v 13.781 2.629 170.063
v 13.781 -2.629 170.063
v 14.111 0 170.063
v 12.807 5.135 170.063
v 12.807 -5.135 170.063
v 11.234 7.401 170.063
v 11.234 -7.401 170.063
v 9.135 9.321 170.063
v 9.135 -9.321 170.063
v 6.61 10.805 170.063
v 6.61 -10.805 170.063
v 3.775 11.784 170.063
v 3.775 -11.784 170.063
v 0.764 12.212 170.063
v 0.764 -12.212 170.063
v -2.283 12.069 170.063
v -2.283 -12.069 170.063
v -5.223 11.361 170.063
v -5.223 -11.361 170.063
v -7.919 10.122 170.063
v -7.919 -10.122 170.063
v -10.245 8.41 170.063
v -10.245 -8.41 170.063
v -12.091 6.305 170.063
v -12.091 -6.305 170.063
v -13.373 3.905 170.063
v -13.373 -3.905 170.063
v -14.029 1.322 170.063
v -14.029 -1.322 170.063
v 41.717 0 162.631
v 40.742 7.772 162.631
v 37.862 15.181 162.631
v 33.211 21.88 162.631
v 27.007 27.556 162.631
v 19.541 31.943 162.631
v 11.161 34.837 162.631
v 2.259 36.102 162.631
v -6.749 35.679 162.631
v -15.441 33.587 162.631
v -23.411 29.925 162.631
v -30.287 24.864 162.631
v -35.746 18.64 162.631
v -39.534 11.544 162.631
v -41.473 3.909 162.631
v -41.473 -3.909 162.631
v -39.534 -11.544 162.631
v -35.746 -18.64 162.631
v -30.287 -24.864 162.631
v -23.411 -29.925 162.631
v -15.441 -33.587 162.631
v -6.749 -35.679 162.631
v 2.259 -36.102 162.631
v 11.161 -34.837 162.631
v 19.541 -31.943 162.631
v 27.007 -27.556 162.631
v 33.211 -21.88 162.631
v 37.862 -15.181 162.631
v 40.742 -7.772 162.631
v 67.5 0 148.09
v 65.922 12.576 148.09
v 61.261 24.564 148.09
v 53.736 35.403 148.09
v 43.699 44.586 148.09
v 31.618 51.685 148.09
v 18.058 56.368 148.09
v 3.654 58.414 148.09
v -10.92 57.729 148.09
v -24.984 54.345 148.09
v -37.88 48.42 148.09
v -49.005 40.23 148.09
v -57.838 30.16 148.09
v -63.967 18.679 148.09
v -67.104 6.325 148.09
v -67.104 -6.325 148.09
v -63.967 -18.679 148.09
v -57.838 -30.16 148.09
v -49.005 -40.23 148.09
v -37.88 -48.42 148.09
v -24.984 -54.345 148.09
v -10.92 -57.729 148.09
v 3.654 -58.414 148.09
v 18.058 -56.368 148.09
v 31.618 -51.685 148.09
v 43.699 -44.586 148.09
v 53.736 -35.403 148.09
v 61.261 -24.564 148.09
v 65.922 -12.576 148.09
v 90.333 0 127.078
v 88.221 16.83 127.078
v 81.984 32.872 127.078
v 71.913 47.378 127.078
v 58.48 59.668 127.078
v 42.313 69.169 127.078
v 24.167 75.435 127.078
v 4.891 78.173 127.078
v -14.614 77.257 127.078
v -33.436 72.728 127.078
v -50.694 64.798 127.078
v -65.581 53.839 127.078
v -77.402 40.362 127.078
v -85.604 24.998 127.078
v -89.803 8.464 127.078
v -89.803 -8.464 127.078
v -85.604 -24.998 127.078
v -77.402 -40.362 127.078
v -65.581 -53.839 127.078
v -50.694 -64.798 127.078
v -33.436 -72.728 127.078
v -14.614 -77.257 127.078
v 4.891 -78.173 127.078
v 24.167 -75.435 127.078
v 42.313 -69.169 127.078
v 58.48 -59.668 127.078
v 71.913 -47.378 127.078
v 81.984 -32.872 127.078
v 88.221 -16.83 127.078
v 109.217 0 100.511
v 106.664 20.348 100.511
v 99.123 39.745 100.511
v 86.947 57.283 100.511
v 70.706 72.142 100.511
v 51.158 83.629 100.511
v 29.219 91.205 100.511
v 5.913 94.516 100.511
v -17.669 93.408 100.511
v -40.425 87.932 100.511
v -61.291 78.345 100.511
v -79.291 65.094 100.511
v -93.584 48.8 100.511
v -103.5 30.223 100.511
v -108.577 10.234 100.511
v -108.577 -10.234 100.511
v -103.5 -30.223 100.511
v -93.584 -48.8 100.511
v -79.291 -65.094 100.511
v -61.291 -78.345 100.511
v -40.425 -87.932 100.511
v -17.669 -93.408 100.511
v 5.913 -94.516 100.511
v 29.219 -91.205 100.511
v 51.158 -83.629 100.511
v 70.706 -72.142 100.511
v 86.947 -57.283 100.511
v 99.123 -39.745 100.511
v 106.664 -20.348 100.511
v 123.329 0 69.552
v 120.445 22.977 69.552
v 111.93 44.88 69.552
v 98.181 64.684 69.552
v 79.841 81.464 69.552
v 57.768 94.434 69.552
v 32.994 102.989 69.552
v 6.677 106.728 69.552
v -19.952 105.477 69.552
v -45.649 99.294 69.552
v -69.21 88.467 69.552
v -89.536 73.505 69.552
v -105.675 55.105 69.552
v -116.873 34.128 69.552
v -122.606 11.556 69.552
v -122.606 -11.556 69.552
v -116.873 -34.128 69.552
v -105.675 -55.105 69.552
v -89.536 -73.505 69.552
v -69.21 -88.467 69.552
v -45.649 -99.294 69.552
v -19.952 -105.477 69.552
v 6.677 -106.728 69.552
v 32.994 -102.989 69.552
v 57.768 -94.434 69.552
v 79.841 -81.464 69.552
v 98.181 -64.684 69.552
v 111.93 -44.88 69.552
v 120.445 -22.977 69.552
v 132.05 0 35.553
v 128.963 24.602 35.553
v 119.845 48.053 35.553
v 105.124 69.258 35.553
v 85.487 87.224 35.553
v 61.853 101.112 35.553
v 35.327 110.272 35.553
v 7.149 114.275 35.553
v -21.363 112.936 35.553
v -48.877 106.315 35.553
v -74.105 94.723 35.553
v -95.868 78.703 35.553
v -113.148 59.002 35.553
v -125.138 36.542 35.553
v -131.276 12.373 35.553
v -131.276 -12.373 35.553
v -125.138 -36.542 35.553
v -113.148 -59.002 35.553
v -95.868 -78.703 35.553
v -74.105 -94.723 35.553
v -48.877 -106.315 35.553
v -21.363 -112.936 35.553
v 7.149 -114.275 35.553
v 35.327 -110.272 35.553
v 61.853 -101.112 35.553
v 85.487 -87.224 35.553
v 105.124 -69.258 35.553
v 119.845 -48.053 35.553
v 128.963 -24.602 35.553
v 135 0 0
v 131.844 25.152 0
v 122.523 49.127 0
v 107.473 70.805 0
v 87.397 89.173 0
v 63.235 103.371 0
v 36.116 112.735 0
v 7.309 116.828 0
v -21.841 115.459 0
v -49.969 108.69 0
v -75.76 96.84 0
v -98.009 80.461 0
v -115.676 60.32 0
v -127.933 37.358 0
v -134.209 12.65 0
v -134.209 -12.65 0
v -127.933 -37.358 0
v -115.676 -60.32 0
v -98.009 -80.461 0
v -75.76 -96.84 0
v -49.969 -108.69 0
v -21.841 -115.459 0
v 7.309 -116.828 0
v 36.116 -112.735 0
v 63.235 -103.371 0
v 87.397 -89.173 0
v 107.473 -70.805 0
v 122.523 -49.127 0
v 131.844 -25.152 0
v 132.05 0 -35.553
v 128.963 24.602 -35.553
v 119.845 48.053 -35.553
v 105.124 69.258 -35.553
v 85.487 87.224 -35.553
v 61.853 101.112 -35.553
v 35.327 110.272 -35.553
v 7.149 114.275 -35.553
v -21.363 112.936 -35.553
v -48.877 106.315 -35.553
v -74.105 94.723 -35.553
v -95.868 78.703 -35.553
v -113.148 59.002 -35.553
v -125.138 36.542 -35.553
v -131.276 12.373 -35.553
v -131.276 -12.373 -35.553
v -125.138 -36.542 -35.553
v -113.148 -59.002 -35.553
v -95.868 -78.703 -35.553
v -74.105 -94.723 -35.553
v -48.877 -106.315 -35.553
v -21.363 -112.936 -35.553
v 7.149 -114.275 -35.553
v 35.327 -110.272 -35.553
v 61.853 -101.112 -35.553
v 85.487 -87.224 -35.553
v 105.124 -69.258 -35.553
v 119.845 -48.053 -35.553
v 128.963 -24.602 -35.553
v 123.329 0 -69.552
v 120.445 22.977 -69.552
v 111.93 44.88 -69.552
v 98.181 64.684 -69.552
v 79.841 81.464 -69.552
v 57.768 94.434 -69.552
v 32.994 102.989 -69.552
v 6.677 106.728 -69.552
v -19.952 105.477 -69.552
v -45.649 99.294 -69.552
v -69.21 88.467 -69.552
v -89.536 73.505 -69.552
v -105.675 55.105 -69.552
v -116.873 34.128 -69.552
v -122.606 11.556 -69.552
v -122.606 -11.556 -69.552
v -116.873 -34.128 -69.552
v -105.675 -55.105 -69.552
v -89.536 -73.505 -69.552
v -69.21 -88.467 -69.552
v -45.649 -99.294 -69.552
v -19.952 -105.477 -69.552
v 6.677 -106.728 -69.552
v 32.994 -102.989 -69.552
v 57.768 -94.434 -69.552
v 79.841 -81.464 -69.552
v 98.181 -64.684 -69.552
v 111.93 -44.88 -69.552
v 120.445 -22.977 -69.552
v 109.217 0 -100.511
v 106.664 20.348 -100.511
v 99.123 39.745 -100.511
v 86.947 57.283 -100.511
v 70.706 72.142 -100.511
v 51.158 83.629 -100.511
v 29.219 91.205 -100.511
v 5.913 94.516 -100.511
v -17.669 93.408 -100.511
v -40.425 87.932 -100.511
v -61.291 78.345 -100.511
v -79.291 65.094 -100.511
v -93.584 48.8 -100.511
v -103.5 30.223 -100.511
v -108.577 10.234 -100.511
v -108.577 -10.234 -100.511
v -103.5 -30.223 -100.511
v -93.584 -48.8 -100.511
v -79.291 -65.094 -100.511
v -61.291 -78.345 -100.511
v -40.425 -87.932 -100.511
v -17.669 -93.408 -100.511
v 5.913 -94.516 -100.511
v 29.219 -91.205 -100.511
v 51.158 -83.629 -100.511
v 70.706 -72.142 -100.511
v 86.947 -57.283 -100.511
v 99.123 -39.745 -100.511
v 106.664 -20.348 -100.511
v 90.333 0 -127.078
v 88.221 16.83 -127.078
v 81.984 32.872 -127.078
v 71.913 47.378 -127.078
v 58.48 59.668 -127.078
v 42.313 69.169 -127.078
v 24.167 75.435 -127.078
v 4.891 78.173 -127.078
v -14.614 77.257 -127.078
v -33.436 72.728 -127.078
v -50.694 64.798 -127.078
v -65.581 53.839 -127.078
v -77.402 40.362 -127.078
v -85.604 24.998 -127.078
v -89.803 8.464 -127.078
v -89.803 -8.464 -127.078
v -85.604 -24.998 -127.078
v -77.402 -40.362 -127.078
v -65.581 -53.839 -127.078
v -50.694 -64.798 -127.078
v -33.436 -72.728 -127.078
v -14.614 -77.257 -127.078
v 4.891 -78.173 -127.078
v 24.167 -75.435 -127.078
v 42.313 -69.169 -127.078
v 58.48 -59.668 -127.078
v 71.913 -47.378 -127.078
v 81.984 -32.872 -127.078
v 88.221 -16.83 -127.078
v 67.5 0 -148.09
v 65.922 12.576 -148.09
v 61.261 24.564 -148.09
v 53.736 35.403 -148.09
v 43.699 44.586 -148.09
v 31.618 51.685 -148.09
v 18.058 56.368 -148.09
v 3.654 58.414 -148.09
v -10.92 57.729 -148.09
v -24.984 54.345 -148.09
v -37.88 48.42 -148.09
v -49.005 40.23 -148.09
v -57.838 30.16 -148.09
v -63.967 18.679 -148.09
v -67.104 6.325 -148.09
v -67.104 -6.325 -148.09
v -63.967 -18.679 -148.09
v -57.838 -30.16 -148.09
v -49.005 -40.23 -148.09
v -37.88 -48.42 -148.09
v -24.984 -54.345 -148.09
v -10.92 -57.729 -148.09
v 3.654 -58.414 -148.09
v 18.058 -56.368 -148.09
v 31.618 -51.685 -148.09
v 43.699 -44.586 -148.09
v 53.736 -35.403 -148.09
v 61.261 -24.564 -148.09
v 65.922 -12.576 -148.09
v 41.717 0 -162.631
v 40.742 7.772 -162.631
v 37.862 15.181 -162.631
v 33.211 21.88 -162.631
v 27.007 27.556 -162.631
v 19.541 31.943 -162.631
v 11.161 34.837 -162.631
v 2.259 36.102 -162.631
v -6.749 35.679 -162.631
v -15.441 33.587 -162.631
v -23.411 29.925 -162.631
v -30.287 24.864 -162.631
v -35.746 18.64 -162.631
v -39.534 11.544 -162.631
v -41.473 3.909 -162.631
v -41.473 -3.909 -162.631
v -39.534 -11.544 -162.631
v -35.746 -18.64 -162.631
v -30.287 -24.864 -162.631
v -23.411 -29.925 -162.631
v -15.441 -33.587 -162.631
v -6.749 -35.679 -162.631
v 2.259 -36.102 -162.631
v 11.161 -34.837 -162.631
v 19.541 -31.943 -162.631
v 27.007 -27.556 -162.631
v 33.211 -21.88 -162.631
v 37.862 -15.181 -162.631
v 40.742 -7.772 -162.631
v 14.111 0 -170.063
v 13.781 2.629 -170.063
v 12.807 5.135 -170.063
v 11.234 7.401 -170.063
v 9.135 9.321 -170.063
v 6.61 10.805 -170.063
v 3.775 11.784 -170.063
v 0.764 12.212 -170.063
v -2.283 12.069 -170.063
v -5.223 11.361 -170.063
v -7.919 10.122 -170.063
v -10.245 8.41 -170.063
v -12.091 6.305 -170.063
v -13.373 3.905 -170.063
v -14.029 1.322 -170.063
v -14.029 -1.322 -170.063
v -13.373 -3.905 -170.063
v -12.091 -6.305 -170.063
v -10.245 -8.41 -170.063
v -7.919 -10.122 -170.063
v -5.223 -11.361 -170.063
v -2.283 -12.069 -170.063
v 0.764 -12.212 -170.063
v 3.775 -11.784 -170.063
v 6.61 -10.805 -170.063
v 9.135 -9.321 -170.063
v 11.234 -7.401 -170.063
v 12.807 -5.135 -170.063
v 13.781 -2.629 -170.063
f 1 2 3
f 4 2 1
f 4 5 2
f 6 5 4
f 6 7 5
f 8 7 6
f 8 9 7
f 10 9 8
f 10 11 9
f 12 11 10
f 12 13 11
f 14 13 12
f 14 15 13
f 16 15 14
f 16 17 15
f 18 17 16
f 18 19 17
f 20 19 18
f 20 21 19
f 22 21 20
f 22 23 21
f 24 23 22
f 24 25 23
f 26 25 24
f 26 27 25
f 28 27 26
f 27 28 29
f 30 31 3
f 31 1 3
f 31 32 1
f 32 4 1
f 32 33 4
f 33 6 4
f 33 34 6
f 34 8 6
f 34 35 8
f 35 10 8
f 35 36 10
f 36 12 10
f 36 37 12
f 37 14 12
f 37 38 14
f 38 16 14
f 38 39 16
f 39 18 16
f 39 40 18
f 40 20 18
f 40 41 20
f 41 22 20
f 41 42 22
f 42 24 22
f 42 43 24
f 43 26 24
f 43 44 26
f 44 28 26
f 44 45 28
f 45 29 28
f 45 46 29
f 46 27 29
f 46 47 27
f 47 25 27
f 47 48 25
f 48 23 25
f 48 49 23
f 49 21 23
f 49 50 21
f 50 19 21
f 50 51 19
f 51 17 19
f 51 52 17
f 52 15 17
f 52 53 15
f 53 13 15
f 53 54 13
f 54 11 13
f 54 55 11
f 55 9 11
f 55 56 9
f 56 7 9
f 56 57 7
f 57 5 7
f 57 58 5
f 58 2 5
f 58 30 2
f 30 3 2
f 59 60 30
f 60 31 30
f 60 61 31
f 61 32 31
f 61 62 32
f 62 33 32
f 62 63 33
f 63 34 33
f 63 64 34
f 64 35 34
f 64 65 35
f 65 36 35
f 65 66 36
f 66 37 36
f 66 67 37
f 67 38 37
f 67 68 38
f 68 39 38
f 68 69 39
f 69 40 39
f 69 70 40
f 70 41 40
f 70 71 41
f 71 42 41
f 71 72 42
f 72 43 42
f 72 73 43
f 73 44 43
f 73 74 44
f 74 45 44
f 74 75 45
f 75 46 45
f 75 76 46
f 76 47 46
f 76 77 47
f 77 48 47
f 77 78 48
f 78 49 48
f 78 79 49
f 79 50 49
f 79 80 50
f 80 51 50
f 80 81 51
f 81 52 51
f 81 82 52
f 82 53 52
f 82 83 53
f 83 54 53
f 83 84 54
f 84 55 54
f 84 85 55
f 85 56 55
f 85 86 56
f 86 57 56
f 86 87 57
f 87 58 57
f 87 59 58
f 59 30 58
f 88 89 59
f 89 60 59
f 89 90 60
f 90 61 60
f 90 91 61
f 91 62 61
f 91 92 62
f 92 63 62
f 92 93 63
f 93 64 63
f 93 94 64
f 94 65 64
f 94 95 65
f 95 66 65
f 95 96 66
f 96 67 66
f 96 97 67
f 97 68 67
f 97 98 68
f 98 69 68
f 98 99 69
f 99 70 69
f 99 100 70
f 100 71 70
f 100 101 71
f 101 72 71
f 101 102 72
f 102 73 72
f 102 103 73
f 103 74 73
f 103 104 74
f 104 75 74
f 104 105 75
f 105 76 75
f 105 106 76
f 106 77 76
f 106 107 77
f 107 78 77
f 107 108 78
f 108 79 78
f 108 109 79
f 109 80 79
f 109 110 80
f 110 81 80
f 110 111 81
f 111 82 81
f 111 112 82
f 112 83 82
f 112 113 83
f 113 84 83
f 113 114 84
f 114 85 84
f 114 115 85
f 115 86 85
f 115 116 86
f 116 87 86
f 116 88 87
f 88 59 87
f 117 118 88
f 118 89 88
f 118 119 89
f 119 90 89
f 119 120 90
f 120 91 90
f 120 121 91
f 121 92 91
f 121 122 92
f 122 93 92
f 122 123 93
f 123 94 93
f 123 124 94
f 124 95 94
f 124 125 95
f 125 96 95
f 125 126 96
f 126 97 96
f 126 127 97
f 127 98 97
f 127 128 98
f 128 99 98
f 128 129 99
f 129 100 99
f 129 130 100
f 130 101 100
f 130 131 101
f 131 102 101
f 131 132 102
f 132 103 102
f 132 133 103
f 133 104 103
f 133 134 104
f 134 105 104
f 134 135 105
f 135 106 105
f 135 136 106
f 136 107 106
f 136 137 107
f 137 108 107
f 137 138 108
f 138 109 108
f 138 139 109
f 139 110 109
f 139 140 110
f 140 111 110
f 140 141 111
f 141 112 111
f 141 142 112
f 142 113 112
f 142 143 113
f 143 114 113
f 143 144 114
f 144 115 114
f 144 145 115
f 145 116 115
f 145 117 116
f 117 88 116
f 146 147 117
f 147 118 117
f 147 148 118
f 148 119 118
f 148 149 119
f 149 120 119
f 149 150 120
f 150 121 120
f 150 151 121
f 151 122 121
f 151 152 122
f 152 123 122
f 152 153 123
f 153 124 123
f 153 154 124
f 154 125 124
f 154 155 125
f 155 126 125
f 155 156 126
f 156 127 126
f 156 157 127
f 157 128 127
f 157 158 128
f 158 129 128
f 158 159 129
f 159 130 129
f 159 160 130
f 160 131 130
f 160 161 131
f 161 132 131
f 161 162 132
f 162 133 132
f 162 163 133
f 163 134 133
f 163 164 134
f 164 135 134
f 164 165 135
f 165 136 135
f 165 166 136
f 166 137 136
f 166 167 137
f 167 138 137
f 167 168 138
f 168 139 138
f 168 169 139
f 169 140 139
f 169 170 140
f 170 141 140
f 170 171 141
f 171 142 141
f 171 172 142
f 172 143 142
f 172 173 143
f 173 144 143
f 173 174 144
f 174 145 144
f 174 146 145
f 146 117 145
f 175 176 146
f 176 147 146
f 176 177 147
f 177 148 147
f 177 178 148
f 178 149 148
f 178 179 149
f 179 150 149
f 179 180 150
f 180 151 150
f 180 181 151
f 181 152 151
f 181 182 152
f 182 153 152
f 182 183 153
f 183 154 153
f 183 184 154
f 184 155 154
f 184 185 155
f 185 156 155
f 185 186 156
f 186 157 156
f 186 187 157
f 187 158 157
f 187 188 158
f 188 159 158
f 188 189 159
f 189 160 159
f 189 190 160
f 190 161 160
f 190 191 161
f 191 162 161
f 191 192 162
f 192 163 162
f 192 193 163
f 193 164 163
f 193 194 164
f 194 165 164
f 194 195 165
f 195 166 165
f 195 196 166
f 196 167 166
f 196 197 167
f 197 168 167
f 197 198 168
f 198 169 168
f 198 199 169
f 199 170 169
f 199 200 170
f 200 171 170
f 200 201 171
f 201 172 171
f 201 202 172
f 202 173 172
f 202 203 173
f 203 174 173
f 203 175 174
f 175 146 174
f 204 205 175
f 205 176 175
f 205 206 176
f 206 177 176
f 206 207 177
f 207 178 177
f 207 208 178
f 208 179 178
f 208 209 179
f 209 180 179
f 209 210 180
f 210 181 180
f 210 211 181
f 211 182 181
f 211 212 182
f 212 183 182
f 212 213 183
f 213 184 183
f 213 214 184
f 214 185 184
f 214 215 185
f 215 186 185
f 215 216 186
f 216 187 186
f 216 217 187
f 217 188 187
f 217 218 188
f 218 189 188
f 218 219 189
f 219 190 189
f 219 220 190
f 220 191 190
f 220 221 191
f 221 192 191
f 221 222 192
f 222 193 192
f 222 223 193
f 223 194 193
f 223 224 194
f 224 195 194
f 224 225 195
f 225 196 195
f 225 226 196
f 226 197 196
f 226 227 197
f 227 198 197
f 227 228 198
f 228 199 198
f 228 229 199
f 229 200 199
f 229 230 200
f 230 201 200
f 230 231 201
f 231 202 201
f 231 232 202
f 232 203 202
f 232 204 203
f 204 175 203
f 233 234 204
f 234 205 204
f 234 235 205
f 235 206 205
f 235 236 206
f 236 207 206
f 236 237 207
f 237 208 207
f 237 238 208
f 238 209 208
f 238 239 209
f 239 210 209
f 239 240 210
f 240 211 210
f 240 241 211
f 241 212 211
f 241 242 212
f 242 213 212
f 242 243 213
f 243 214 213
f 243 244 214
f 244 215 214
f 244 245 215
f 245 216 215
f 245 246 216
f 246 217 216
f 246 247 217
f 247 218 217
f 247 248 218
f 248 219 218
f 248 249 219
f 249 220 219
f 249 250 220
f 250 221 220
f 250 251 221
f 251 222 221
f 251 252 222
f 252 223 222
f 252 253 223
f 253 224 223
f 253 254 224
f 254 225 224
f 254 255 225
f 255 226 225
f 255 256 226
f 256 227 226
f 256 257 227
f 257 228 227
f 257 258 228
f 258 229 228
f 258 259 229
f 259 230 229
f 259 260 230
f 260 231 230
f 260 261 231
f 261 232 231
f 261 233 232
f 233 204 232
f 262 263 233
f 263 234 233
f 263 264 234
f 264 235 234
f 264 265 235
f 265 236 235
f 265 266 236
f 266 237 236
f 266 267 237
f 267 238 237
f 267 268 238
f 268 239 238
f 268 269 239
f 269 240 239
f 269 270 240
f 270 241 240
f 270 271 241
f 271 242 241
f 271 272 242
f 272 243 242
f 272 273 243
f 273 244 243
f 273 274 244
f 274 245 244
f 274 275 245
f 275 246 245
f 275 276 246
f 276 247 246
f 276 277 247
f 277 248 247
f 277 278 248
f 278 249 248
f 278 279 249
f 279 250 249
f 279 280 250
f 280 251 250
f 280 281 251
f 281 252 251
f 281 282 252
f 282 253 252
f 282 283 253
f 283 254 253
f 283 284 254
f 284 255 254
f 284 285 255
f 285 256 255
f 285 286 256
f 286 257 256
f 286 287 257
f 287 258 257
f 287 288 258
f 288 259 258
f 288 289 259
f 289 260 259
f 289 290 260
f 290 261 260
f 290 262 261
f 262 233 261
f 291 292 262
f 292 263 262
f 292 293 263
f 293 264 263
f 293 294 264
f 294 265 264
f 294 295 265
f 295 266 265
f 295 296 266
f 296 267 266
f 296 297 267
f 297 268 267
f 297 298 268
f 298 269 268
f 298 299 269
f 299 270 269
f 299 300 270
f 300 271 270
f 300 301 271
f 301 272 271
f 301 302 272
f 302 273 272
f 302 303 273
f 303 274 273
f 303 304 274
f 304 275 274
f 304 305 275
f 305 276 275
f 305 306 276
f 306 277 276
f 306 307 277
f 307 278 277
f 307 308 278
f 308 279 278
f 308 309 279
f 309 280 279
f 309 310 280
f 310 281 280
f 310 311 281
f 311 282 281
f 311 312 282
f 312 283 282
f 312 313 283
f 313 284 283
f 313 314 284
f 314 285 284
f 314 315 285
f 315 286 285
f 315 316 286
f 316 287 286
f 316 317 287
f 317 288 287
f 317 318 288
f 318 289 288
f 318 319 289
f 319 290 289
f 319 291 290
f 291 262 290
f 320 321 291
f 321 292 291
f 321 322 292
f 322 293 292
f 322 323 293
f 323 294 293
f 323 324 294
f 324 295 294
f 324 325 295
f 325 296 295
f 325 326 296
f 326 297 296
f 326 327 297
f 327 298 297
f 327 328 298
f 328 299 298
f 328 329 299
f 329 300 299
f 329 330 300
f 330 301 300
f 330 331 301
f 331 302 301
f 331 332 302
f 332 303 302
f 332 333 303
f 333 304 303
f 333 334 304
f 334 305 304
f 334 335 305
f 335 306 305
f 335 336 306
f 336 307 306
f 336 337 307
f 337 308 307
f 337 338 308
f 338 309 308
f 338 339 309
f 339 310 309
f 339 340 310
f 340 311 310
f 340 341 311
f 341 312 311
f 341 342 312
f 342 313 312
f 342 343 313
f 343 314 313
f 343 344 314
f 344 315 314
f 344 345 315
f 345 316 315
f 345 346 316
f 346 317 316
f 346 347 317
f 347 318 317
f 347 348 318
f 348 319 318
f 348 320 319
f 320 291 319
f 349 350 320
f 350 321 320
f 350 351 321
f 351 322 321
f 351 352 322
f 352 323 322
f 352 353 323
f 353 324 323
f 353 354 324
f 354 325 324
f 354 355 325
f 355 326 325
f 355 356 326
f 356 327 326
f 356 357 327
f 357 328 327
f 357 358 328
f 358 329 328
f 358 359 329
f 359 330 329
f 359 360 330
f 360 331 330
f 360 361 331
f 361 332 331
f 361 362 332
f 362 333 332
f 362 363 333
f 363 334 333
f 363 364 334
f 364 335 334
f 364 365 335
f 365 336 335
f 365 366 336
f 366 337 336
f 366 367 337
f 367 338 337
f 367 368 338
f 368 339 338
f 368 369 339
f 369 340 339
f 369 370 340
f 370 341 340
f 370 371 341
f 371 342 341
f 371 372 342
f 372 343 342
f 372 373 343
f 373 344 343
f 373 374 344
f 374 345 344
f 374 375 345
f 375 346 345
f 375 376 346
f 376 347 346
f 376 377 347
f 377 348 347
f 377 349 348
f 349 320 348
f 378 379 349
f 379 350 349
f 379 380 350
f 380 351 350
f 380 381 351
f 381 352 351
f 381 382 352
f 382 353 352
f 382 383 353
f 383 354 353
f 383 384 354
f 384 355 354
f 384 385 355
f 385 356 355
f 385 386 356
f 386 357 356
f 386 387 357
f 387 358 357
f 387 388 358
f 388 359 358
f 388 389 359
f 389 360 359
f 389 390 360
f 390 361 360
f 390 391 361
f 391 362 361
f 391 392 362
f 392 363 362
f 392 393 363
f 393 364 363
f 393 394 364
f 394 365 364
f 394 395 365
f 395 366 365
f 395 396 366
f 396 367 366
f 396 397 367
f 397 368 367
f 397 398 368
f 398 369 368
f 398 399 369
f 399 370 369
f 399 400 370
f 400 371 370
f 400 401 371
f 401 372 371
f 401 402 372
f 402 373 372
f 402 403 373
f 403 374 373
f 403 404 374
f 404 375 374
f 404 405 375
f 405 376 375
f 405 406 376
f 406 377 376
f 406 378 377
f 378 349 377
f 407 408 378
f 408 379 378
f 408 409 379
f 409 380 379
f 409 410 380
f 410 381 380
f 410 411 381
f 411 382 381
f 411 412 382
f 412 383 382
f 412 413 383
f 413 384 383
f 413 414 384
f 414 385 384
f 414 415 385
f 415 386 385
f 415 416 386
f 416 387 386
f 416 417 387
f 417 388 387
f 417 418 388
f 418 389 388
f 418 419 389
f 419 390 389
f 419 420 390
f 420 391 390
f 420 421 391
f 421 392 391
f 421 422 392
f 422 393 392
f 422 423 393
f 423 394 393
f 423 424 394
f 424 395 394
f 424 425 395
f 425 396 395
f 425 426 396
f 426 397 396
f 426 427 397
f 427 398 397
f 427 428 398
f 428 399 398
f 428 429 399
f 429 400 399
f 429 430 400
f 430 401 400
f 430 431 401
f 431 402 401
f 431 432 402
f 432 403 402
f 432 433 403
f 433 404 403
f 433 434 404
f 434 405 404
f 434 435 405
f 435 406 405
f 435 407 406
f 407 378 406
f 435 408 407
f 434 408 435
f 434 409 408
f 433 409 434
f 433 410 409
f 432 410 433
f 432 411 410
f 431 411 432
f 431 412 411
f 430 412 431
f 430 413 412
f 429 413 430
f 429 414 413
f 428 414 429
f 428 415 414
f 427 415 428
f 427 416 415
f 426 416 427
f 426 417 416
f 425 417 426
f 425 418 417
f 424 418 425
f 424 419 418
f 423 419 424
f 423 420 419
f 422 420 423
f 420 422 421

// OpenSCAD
// Generated by SolidPython 1.0.1 on 2020-07-29 00:46:52


scale(v = [15, 13, 19]) {
	sphere(r = 9);
}
/***********************************************
*********      SolidPython code:      **********
************************************************
 
# import packages: SolidPython
from solid import *
from solid.utils import *
from itertools import chain, combinations, permutations


class Resize:

    def __init__(self, scad_file):
        self.scad_file = scad_file
        #self.scad_file = import_scad(scad_file)
        # cone/cylinder param:
        self.r1 = 0
        self.r2 = 0
        self.h = 0
        # rectangular prism param:
        self.w = 0
        self.l = 0
        # ellipse param:
        self.r = 0

    # import OpenScad code (file name corresponds to shape)


    # classify shape + parameters
    def assign(self, param1, param2, param3):
        if self.scad_file == 'cone.scad':
            self.r1 = param1
            self.r2 = param2
            self.h = param3
        elif self.scad_file == 'cylinder.scad':
            self.r1 = param1
            self.r2 = param2
            self.h = param3
        elif self.scad_file == 'rectangularPrism.scad':
            self.h = param1
            self.l = param2
            self.w = param3
        else:
            self.r = param1
            self.h = param2

    # resize parameters
    def iterate(self):
        x = range(3, 20, 2)
        i = 1
        if self.scad_file == 'cone.scad':
            tempList = list(permutations(x, 2))
            for temp in tempList:
                param1 = temp[0]
                param2 = temp[1]
                filepath = 'produced_scad_files/' + 'cone' + str(param1) + '_' + str(param2) + '_' + '.scad'
                scad_render_to_file(cylinder(h=param1, r1=param2, r2=0), filepath)

        elif self.scad_file == 'cylinder.scad':
            tempList = list(permutations(x, 3))
            for temp in tempList:
                param1 = temp[0]
                param2 = temp[1]
                filepath = 'produced_scad_files/' + 'cylinder' + str(param1) + '_' + str(param2) + '_' + '.scad'
                scad_render_to_file(cylinder(h=param1, r1=param2, r2=param2), filepath)

        elif self.scad_file == 'rectangularPrism.scad':
            tempList = list(permutations(x, 3))
            for temp in tempList:
                param1 = temp[0]
                param2 = temp[1]
                param3 = temp[2]
                filepath = 'produced_scad_files/' + 'rectangularPrism' + str(param1) + '_' + str(param2) + '_' + str(
                    param3) + '.scad'
                scad_render_to_file(cube(size=(param1, param2, param3)), filepath)

        elif self.scad_file == 'ellipse.scad':
            tempList = list(permutations(x, 4))
            for temp in tempList:
                param1 = temp[0]
                param2 = temp[1]
                param3 = temp[2]
                param4 = temp[3]
                filepath = 'produced_scad_files/' + 'ellipse' + str(param1) + '_' + str(param2) + '_' + str(param3) + '_' + str(param4) + '.scad'
                scad_render_to_file(scale([param1, param2, param3])(sphere(r=param4)), filepath)

    def render_to_scadfile(self):
        scad_render_to_file(scad, 'example.scad') 
 
************************************************/
